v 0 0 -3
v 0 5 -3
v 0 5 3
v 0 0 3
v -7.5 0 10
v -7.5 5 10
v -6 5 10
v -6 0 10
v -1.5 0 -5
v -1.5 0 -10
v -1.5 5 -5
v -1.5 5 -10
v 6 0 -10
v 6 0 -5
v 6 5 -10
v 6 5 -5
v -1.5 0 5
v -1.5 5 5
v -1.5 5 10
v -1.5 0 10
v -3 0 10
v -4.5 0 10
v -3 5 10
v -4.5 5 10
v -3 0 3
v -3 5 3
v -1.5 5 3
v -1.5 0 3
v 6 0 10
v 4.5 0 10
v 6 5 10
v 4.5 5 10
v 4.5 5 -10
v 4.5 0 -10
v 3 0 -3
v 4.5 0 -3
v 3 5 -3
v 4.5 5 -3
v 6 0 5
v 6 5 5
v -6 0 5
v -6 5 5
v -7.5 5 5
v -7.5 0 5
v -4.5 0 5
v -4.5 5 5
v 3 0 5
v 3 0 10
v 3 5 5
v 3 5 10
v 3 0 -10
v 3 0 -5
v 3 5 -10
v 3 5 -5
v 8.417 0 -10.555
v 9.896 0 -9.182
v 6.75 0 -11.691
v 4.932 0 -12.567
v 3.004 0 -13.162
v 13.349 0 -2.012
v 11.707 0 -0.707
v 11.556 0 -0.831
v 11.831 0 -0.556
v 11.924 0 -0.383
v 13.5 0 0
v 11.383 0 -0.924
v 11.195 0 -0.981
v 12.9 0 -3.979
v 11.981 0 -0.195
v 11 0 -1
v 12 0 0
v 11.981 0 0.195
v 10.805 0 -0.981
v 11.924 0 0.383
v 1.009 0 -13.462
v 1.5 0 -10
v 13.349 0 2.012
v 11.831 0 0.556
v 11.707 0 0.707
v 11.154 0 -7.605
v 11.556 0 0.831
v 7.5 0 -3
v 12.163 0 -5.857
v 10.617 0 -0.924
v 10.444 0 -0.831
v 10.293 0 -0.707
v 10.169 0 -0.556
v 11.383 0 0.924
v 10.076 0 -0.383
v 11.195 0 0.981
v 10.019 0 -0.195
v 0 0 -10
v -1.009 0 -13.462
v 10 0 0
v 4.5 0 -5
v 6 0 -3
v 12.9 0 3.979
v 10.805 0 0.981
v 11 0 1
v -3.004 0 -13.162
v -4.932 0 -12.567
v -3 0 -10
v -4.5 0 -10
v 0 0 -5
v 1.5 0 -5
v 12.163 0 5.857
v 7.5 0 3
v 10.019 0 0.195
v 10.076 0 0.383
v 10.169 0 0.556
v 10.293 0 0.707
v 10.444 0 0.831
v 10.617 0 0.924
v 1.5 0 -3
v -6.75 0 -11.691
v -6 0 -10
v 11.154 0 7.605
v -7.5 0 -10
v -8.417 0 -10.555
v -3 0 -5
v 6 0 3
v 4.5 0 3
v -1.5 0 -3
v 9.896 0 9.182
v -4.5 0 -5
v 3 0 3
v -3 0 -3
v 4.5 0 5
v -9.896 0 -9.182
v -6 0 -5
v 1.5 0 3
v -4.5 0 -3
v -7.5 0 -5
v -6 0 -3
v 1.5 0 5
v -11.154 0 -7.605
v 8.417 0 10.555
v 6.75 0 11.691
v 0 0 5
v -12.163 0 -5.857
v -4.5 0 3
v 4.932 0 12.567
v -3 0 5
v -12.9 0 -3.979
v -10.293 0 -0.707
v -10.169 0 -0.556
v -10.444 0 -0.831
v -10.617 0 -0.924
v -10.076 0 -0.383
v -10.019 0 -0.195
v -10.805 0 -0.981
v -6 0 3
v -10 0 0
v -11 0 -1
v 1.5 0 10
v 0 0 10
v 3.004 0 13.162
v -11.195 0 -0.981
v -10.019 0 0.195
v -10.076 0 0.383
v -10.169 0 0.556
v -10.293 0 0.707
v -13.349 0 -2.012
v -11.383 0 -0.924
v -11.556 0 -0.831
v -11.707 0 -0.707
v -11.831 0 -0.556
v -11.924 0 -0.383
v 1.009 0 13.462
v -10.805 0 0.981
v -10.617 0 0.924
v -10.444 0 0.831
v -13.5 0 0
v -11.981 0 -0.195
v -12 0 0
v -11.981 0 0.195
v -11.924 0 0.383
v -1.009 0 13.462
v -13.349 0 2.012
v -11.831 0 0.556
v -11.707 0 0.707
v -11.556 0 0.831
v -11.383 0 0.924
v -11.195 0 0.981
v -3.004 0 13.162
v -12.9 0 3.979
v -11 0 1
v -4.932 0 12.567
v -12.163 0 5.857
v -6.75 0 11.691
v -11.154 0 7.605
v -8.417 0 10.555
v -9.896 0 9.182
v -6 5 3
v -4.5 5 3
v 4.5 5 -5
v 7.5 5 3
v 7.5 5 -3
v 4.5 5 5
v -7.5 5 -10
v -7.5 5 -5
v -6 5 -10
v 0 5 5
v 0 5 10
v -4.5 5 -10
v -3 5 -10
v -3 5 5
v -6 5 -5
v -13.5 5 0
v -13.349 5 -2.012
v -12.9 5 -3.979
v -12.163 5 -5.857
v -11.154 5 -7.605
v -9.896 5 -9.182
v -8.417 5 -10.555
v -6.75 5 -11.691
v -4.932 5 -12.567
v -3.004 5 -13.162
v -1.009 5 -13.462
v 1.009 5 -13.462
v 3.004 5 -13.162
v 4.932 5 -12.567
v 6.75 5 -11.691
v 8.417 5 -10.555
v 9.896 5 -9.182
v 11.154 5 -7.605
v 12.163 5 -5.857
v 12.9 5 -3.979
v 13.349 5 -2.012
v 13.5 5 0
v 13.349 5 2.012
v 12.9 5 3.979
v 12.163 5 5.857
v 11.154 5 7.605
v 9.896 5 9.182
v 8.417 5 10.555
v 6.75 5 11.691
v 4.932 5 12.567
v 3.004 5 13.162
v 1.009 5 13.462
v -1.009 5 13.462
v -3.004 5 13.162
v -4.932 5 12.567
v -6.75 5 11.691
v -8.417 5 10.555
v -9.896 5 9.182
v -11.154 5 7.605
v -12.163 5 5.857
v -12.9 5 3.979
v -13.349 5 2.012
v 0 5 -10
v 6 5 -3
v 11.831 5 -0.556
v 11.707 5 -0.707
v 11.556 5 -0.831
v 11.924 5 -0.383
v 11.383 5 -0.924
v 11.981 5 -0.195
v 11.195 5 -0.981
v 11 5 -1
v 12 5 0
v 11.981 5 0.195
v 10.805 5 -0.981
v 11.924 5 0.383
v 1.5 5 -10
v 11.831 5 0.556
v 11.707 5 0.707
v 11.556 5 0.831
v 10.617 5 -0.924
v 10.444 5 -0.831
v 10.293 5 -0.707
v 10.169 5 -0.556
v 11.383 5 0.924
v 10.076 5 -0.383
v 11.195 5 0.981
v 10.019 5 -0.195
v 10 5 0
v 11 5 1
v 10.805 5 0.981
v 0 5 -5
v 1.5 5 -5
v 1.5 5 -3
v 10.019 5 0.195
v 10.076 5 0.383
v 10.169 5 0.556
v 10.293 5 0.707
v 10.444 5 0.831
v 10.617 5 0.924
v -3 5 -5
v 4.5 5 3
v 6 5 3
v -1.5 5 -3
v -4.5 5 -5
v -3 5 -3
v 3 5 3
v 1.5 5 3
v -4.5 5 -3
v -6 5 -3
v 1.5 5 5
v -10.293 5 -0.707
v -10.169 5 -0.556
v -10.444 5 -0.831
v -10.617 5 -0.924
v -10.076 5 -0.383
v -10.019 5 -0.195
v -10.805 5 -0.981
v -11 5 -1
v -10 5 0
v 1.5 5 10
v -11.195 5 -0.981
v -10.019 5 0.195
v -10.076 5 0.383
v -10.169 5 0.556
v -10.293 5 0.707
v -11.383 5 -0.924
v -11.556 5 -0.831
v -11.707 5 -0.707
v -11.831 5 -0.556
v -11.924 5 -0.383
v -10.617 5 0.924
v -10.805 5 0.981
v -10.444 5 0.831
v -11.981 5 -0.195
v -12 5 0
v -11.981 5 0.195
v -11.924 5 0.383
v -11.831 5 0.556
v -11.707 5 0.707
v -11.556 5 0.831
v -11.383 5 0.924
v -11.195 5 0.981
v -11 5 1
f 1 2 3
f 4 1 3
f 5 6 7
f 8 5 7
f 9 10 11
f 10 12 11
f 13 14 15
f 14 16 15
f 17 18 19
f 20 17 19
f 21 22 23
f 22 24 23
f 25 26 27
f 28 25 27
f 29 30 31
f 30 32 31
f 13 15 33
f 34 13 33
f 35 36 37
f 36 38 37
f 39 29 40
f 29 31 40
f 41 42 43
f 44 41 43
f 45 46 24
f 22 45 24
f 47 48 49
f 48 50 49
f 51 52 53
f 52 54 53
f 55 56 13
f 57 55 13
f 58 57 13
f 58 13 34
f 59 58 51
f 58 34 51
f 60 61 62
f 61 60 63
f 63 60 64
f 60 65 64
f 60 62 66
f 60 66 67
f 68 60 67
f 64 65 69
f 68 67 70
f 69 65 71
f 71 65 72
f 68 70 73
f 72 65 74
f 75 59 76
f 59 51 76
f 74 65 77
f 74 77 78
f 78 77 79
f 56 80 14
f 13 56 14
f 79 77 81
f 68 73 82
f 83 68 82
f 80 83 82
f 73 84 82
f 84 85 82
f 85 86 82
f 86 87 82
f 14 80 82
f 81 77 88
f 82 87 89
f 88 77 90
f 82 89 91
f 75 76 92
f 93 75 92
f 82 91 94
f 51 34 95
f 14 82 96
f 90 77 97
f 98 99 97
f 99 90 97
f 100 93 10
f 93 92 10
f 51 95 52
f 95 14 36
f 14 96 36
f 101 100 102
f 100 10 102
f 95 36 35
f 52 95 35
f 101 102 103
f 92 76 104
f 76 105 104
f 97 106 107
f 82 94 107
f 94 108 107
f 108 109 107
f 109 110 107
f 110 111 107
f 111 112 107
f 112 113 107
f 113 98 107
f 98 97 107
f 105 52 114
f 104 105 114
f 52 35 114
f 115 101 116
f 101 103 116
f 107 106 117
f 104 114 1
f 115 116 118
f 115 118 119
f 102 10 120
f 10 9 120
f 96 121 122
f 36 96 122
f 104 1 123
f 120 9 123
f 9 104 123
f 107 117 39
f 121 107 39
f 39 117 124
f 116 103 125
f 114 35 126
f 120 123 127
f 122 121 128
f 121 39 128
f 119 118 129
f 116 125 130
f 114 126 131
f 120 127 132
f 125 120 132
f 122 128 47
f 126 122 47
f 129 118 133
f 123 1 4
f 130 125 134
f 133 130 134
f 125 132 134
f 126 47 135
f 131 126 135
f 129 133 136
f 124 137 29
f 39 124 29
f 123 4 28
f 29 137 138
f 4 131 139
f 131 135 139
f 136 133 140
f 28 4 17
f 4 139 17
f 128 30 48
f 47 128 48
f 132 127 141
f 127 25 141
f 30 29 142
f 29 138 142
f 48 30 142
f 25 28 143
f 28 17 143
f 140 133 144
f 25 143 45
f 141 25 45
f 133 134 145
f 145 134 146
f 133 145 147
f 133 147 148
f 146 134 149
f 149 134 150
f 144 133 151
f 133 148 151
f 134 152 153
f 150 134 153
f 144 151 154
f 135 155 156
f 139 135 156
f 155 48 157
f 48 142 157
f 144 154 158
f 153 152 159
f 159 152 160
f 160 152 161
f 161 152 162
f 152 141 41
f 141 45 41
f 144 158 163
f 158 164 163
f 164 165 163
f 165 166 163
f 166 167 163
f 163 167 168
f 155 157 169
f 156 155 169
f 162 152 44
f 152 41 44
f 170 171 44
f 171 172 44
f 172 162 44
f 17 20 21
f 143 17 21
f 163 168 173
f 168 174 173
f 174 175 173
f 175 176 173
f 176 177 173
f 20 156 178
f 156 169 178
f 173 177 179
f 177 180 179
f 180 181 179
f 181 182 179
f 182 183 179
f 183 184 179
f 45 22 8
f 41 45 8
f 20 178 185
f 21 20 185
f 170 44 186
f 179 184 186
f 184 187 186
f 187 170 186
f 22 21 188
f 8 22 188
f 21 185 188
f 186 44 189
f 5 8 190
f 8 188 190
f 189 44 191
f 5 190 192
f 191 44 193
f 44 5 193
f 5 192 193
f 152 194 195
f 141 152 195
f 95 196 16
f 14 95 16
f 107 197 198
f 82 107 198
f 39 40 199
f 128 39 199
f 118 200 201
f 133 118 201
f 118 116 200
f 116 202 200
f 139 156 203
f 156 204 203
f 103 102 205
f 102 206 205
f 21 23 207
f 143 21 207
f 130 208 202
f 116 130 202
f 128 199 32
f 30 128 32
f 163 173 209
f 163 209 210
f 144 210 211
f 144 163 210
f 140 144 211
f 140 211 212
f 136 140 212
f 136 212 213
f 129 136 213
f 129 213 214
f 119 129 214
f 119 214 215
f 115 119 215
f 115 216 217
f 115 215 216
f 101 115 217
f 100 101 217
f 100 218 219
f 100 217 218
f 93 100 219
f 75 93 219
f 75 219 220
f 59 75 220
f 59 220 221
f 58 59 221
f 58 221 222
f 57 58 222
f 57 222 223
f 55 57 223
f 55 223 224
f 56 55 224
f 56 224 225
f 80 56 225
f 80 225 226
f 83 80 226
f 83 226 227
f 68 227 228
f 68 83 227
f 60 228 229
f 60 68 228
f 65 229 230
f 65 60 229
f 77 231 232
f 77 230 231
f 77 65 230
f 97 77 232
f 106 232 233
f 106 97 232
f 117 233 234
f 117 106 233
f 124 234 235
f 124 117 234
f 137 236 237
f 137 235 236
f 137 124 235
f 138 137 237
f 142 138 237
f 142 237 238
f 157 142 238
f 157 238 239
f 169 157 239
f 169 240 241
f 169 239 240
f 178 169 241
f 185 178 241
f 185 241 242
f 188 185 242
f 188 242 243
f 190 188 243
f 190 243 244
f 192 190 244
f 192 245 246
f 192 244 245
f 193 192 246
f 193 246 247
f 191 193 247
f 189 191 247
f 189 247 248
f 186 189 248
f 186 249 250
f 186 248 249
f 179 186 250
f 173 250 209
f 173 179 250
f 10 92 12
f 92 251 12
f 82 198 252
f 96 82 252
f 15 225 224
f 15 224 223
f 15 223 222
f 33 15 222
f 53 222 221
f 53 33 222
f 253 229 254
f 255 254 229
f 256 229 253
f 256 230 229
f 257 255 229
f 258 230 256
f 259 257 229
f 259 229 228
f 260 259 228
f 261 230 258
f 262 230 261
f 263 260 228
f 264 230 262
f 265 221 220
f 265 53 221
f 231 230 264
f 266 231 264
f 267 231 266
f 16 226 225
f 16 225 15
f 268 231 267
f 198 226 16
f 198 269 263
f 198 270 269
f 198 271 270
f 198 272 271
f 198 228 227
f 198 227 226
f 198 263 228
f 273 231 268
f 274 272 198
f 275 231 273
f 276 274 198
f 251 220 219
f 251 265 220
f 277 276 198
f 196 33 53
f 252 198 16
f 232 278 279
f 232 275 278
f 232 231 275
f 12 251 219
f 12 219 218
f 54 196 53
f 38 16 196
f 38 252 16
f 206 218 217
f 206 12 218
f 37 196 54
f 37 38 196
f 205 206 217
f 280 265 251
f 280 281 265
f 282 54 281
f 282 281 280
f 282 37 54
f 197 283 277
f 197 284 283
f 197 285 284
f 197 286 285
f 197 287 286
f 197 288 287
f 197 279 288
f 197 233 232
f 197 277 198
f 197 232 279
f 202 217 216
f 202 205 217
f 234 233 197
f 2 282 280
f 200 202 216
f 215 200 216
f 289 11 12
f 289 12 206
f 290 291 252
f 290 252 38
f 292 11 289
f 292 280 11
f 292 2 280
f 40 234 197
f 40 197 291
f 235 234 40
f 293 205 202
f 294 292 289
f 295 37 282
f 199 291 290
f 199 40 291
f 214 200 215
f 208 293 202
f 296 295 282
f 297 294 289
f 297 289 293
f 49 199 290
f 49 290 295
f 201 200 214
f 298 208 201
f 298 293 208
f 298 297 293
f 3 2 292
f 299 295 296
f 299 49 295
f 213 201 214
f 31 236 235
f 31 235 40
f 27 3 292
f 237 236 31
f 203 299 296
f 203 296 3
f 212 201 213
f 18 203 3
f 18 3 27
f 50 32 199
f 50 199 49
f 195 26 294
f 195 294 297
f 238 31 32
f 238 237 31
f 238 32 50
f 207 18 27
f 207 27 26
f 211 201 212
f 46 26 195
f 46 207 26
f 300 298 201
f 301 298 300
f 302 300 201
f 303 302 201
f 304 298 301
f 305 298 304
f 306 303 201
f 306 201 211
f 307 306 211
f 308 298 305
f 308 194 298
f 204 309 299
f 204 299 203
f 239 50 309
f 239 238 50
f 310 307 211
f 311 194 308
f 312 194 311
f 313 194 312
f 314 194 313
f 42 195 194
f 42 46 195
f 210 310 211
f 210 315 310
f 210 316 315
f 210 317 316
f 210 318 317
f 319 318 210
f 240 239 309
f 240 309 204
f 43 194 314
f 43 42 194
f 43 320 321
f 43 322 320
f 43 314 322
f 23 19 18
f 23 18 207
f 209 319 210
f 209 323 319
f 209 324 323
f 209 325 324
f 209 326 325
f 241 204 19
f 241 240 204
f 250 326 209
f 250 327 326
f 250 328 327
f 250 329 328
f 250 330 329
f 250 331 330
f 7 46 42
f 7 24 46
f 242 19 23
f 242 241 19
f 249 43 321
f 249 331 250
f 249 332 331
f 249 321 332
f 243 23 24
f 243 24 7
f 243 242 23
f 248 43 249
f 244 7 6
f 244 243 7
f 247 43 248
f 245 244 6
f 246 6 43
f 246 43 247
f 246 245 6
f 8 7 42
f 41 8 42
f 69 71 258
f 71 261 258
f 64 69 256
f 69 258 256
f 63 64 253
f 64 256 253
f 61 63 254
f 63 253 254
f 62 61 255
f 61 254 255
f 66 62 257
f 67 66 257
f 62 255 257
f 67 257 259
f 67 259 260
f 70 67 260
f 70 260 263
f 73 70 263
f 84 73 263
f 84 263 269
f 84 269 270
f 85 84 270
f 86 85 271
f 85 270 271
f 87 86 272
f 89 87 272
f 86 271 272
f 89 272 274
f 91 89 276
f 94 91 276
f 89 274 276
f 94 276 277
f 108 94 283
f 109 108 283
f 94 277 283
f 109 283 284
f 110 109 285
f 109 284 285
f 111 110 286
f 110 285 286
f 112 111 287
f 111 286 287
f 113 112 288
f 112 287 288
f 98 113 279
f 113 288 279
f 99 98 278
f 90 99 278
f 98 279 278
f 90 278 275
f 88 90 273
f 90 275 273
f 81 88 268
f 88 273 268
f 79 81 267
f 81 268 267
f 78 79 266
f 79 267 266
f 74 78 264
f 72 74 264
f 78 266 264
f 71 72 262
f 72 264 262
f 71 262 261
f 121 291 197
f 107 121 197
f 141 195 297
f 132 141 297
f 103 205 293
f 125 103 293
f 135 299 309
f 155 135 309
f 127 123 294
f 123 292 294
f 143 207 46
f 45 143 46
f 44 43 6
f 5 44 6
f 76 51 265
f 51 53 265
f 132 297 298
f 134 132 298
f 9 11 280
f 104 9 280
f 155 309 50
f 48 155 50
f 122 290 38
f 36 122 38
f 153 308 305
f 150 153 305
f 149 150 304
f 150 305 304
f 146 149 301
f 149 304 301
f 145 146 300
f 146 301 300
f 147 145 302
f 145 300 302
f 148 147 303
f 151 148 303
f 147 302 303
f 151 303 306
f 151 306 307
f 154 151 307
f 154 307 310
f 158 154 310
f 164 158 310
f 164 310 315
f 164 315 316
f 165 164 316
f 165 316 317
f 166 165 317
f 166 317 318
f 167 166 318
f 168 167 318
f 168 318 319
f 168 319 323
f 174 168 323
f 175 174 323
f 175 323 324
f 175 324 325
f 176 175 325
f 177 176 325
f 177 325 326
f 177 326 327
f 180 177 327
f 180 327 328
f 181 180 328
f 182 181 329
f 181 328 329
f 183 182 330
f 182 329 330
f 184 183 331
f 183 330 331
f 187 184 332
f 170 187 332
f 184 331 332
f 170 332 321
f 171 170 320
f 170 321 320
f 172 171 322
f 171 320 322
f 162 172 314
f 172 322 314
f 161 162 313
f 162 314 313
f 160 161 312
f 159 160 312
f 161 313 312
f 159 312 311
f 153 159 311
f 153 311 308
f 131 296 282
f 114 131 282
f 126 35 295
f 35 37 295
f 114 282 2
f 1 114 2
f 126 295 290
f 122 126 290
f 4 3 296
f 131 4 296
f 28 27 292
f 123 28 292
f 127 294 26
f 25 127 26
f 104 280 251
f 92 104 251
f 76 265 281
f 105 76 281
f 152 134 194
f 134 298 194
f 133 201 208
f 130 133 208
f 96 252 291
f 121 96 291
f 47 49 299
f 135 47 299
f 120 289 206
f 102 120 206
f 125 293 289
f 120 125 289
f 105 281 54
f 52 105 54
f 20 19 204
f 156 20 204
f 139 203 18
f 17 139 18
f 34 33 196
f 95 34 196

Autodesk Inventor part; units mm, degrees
ref_plane "YZ Plane" through (0, 0, 0) normal (1, 0, 0) x (0, 1, 0)
ref_plane "XZ Plane" through (0, 0, 0) normal (0, 1, 0) x (-1, 0, 0)
ref_plane "XY Plane" through (0, 0, 0) normal (0, 0, 1) x (1, 0, 0)
sketch "Sketch1" plane through (0, 0, 0) normal (0, 1, 0) x (-1, 0, 0)
  circle A0 centre (0, 0) radius 13.5
  dimension "d0" = 27
extrude "Extrusion1" add sketch "Sketch1" along normal blind 5
sketch "Sketch2" plane through (0, 5, 0) normal (0, 1, 0) x (1, 0, 0)
  line L0 (7.5, -10) -> (7.5, 10)
  line L1 (7.5, 10) -> (-7.5, 10)
  circle A0 centre (0, 0) radius 13.5 projected
  line L2 (-7.5, -10) -> (-6, -10)
  line L3 (-6, -10) -> (-6, -5)
  line L4 (-6, -5) -> (-7.5, -5)
  line L5 (-7.5, -5) -> (-7.5, -10)
  line L6 (-7.5, 5) -> (-6, 5)
  line L7 (-6, 5) -> (-6, 10)
  line L8 (-6, 10) -> (-7.5, 10)
  line L9 (-7.5, 10) -> (-7.5, 5)
  line L10 (-6, -3) -> (-4.5, -3)
  line L11 (-4.5, -3) -> (-4.5, 3)
  line L12 (-4.5, 3) -> (-6, 3)
  line L13 (-6, 3) -> (-6, -3)
  line L14 (-4.5, -10) -> (-3, -10)
  line L15 (-3, -10) -> (-3, -5)
  line L16 (-3, -5) -> (-4.5, -5)
  line L17 (-4.5, -5) -> (-4.5, -10)
  line L18 (-4.5, 5) -> (-3, 5)
  line L19 (-4.5, 10) -> (-4.5, 5)
  line L20 (-3, 5) -> (-3, 10)
  line L21 (-3, 10) -> (-4.5, 10)
  line L22 (-3, -3) -> (-1.5, -3)
  line L23 (-1.5, -3) -> (-1.5, 3)
  line L24 (-1.5, 3) -> (-3, 3)
  line L25 (-3, 3) -> (-3, -3)
  line L26 (-1.5, -10) -> (0, -10)
  line L27 (0, -10) -> (0, -5)
  line L28 (0, -5) -> (-1.5, -5)
  line L29 (-1.5, -5) -> (-1.5, -10)
  line L30 (-1.5, 5) -> (0, 5)
  line L31 (-1.5, 10) -> (-1.5, 5)
  line L32 (0, 5) -> (0, 10)
  line L33 (0, 10) -> (-1.5, 10)
  line L34 (0, -3) -> (1.5, -3)
  line L35 (1.5, -3) -> (1.5, 3)
  line L36 (1.5, 3) -> (0, 3)
  line L37 (0, 3) -> (0, -3)
  line L38 (1.5, -10) -> (3, -10)
  line L39 (3, -10) -> (3, -5)
  line L40 (3, -5) -> (1.5, -5)
  line L41 (1.5, -5) -> (1.5, -10)
  line L42 (1.5, 5) -> (3, 5)
  line L43 (1.5, 10) -> (1.5, 5)
  line L44 (3, 5) -> (3, 10)
  line L45 (3, 10) -> (1.5, 10)
  line L46 (3, -3) -> (4.5, -3)
  line L47 (4.5, -3) -> (4.5, 3)
  line L48 (4.5, 3) -> (3, 3)
  line L49 (3, 3) -> (3, -3)
  line L50 (4.5, -10) -> (6, -10)
  line L51 (6, -10) -> (6, -5)
  line L52 (6, -5) -> (4.5, -5)
  line L53 (4.5, -5) -> (4.5, -10)
  line L54 (4.5, 5) -> (6, 5)
  line L55 (4.5, 10) -> (4.5, 5)
  line L56 (6, 5) -> (6, 10)
  line L57 (6, 10) -> (4.5, 10)
  line L58 (6, -3) -> (7.5, -3)
  line L59 (7.5, -3) -> (7.5, 3)
  line L60 (7.5, 3) -> (6, 3)
  line L61 (6, 3) -> (6, -3)
  line L62 (-7.5, -10) -> (-7.5, 10)
  line L63 (7.5, -10) -> (-7.5, -10)
  point P0 (-4.5, 5)
  point P1 (-1.5, 5)
  point P2 (1.5, -5)
  point P3 (1.5, 5)
  point P4 (4.5, -5)
  point P5 (4.5, 5)
  point P6 (7.5, -5)
  point P7 (7.5, 5)
  dimension "d4" = 20
  dimension "d5" = 15
  dimension "d8" = 1.5
  dimension "d9" = 5
  dimension "d10" = 1.5
  dimension "d11" = 5
  dimension "d14" = 1.5
  dimension "d16" = 2
  dimension "d25" = 1.5
  dimension "d26" = 5
  dimension "d27" = 1.5
  dimension "d29" = 1.5
  dimension "d31" = 1.5
  dimension "d32" = 5
  dimension "d33" = 1.5
  dimension "d35" = 1.5
  dimension "d37" = 1.5
  dimension "d38" = 5
  dimension "d39" = 1.5
  dimension "d41" = 1.5
  dimension "d43" = 1.5
  dimension "d44" = 5
  dimension "d45" = 1.5
  dimension "d47" = 1.5
  dimension "d49" = 20
  dimension "d50" = 15
extrude "Extrusion2" cut sketch "Sketch2" against normal blind 5 contours L58 L61 L60 L0 | L50 L53 L52 L51 | L38 L41 L40 L39 | L56 L54 L55 L1 | L26 L29 L28 L27 | L44 L42 L43 L1 | L14 L17 L16 L15 | L32 L30 L31 L1 | L2 L5 L4 L3 | L20 L18 L19 L1 | L7 L6 L9 L1 | L13 L12 L11 L10 | L25 L24 L23 L22 | L37 L36 L35 L34 | L49 L48 L47 L46
sketch "Sketch3" plane through (0, 5, 0) normal (0, 1, 0) x (1, 0, 0)
  point P0 (0, 0)
sketch "Sketch4" plane through (0, 5, 0) normal (0, 1, 0) x (1, 0, 0)
  point P0 (0, 0)
sketch "Sketch5" plane through (0, 5, 0) normal (0, 1, 0) x (1, 0, 0)
  point P0 (0, 0)
sketch "Sketch6" plane through (0, 5, 0) normal (0, 1, 0) x (1, 0, 0)
  circle A0 centre (-11, 0) radius 1
  circle A1 centre (0, 0) radius 13.5 projected
  circle A2 centre (11, 0) radius 1
  line L0 (0, -3) -> (0, 3) projected
  dimension "d53" = 2
  dimension "d54" = 11
  dimension "d55" = 2
  dimension "d56" = 11
extrude "Extrusion3" cut sketch "Sketch6" against normal blind 5 contours A0 | A2
properties part number "Acrylic_Seperator"
